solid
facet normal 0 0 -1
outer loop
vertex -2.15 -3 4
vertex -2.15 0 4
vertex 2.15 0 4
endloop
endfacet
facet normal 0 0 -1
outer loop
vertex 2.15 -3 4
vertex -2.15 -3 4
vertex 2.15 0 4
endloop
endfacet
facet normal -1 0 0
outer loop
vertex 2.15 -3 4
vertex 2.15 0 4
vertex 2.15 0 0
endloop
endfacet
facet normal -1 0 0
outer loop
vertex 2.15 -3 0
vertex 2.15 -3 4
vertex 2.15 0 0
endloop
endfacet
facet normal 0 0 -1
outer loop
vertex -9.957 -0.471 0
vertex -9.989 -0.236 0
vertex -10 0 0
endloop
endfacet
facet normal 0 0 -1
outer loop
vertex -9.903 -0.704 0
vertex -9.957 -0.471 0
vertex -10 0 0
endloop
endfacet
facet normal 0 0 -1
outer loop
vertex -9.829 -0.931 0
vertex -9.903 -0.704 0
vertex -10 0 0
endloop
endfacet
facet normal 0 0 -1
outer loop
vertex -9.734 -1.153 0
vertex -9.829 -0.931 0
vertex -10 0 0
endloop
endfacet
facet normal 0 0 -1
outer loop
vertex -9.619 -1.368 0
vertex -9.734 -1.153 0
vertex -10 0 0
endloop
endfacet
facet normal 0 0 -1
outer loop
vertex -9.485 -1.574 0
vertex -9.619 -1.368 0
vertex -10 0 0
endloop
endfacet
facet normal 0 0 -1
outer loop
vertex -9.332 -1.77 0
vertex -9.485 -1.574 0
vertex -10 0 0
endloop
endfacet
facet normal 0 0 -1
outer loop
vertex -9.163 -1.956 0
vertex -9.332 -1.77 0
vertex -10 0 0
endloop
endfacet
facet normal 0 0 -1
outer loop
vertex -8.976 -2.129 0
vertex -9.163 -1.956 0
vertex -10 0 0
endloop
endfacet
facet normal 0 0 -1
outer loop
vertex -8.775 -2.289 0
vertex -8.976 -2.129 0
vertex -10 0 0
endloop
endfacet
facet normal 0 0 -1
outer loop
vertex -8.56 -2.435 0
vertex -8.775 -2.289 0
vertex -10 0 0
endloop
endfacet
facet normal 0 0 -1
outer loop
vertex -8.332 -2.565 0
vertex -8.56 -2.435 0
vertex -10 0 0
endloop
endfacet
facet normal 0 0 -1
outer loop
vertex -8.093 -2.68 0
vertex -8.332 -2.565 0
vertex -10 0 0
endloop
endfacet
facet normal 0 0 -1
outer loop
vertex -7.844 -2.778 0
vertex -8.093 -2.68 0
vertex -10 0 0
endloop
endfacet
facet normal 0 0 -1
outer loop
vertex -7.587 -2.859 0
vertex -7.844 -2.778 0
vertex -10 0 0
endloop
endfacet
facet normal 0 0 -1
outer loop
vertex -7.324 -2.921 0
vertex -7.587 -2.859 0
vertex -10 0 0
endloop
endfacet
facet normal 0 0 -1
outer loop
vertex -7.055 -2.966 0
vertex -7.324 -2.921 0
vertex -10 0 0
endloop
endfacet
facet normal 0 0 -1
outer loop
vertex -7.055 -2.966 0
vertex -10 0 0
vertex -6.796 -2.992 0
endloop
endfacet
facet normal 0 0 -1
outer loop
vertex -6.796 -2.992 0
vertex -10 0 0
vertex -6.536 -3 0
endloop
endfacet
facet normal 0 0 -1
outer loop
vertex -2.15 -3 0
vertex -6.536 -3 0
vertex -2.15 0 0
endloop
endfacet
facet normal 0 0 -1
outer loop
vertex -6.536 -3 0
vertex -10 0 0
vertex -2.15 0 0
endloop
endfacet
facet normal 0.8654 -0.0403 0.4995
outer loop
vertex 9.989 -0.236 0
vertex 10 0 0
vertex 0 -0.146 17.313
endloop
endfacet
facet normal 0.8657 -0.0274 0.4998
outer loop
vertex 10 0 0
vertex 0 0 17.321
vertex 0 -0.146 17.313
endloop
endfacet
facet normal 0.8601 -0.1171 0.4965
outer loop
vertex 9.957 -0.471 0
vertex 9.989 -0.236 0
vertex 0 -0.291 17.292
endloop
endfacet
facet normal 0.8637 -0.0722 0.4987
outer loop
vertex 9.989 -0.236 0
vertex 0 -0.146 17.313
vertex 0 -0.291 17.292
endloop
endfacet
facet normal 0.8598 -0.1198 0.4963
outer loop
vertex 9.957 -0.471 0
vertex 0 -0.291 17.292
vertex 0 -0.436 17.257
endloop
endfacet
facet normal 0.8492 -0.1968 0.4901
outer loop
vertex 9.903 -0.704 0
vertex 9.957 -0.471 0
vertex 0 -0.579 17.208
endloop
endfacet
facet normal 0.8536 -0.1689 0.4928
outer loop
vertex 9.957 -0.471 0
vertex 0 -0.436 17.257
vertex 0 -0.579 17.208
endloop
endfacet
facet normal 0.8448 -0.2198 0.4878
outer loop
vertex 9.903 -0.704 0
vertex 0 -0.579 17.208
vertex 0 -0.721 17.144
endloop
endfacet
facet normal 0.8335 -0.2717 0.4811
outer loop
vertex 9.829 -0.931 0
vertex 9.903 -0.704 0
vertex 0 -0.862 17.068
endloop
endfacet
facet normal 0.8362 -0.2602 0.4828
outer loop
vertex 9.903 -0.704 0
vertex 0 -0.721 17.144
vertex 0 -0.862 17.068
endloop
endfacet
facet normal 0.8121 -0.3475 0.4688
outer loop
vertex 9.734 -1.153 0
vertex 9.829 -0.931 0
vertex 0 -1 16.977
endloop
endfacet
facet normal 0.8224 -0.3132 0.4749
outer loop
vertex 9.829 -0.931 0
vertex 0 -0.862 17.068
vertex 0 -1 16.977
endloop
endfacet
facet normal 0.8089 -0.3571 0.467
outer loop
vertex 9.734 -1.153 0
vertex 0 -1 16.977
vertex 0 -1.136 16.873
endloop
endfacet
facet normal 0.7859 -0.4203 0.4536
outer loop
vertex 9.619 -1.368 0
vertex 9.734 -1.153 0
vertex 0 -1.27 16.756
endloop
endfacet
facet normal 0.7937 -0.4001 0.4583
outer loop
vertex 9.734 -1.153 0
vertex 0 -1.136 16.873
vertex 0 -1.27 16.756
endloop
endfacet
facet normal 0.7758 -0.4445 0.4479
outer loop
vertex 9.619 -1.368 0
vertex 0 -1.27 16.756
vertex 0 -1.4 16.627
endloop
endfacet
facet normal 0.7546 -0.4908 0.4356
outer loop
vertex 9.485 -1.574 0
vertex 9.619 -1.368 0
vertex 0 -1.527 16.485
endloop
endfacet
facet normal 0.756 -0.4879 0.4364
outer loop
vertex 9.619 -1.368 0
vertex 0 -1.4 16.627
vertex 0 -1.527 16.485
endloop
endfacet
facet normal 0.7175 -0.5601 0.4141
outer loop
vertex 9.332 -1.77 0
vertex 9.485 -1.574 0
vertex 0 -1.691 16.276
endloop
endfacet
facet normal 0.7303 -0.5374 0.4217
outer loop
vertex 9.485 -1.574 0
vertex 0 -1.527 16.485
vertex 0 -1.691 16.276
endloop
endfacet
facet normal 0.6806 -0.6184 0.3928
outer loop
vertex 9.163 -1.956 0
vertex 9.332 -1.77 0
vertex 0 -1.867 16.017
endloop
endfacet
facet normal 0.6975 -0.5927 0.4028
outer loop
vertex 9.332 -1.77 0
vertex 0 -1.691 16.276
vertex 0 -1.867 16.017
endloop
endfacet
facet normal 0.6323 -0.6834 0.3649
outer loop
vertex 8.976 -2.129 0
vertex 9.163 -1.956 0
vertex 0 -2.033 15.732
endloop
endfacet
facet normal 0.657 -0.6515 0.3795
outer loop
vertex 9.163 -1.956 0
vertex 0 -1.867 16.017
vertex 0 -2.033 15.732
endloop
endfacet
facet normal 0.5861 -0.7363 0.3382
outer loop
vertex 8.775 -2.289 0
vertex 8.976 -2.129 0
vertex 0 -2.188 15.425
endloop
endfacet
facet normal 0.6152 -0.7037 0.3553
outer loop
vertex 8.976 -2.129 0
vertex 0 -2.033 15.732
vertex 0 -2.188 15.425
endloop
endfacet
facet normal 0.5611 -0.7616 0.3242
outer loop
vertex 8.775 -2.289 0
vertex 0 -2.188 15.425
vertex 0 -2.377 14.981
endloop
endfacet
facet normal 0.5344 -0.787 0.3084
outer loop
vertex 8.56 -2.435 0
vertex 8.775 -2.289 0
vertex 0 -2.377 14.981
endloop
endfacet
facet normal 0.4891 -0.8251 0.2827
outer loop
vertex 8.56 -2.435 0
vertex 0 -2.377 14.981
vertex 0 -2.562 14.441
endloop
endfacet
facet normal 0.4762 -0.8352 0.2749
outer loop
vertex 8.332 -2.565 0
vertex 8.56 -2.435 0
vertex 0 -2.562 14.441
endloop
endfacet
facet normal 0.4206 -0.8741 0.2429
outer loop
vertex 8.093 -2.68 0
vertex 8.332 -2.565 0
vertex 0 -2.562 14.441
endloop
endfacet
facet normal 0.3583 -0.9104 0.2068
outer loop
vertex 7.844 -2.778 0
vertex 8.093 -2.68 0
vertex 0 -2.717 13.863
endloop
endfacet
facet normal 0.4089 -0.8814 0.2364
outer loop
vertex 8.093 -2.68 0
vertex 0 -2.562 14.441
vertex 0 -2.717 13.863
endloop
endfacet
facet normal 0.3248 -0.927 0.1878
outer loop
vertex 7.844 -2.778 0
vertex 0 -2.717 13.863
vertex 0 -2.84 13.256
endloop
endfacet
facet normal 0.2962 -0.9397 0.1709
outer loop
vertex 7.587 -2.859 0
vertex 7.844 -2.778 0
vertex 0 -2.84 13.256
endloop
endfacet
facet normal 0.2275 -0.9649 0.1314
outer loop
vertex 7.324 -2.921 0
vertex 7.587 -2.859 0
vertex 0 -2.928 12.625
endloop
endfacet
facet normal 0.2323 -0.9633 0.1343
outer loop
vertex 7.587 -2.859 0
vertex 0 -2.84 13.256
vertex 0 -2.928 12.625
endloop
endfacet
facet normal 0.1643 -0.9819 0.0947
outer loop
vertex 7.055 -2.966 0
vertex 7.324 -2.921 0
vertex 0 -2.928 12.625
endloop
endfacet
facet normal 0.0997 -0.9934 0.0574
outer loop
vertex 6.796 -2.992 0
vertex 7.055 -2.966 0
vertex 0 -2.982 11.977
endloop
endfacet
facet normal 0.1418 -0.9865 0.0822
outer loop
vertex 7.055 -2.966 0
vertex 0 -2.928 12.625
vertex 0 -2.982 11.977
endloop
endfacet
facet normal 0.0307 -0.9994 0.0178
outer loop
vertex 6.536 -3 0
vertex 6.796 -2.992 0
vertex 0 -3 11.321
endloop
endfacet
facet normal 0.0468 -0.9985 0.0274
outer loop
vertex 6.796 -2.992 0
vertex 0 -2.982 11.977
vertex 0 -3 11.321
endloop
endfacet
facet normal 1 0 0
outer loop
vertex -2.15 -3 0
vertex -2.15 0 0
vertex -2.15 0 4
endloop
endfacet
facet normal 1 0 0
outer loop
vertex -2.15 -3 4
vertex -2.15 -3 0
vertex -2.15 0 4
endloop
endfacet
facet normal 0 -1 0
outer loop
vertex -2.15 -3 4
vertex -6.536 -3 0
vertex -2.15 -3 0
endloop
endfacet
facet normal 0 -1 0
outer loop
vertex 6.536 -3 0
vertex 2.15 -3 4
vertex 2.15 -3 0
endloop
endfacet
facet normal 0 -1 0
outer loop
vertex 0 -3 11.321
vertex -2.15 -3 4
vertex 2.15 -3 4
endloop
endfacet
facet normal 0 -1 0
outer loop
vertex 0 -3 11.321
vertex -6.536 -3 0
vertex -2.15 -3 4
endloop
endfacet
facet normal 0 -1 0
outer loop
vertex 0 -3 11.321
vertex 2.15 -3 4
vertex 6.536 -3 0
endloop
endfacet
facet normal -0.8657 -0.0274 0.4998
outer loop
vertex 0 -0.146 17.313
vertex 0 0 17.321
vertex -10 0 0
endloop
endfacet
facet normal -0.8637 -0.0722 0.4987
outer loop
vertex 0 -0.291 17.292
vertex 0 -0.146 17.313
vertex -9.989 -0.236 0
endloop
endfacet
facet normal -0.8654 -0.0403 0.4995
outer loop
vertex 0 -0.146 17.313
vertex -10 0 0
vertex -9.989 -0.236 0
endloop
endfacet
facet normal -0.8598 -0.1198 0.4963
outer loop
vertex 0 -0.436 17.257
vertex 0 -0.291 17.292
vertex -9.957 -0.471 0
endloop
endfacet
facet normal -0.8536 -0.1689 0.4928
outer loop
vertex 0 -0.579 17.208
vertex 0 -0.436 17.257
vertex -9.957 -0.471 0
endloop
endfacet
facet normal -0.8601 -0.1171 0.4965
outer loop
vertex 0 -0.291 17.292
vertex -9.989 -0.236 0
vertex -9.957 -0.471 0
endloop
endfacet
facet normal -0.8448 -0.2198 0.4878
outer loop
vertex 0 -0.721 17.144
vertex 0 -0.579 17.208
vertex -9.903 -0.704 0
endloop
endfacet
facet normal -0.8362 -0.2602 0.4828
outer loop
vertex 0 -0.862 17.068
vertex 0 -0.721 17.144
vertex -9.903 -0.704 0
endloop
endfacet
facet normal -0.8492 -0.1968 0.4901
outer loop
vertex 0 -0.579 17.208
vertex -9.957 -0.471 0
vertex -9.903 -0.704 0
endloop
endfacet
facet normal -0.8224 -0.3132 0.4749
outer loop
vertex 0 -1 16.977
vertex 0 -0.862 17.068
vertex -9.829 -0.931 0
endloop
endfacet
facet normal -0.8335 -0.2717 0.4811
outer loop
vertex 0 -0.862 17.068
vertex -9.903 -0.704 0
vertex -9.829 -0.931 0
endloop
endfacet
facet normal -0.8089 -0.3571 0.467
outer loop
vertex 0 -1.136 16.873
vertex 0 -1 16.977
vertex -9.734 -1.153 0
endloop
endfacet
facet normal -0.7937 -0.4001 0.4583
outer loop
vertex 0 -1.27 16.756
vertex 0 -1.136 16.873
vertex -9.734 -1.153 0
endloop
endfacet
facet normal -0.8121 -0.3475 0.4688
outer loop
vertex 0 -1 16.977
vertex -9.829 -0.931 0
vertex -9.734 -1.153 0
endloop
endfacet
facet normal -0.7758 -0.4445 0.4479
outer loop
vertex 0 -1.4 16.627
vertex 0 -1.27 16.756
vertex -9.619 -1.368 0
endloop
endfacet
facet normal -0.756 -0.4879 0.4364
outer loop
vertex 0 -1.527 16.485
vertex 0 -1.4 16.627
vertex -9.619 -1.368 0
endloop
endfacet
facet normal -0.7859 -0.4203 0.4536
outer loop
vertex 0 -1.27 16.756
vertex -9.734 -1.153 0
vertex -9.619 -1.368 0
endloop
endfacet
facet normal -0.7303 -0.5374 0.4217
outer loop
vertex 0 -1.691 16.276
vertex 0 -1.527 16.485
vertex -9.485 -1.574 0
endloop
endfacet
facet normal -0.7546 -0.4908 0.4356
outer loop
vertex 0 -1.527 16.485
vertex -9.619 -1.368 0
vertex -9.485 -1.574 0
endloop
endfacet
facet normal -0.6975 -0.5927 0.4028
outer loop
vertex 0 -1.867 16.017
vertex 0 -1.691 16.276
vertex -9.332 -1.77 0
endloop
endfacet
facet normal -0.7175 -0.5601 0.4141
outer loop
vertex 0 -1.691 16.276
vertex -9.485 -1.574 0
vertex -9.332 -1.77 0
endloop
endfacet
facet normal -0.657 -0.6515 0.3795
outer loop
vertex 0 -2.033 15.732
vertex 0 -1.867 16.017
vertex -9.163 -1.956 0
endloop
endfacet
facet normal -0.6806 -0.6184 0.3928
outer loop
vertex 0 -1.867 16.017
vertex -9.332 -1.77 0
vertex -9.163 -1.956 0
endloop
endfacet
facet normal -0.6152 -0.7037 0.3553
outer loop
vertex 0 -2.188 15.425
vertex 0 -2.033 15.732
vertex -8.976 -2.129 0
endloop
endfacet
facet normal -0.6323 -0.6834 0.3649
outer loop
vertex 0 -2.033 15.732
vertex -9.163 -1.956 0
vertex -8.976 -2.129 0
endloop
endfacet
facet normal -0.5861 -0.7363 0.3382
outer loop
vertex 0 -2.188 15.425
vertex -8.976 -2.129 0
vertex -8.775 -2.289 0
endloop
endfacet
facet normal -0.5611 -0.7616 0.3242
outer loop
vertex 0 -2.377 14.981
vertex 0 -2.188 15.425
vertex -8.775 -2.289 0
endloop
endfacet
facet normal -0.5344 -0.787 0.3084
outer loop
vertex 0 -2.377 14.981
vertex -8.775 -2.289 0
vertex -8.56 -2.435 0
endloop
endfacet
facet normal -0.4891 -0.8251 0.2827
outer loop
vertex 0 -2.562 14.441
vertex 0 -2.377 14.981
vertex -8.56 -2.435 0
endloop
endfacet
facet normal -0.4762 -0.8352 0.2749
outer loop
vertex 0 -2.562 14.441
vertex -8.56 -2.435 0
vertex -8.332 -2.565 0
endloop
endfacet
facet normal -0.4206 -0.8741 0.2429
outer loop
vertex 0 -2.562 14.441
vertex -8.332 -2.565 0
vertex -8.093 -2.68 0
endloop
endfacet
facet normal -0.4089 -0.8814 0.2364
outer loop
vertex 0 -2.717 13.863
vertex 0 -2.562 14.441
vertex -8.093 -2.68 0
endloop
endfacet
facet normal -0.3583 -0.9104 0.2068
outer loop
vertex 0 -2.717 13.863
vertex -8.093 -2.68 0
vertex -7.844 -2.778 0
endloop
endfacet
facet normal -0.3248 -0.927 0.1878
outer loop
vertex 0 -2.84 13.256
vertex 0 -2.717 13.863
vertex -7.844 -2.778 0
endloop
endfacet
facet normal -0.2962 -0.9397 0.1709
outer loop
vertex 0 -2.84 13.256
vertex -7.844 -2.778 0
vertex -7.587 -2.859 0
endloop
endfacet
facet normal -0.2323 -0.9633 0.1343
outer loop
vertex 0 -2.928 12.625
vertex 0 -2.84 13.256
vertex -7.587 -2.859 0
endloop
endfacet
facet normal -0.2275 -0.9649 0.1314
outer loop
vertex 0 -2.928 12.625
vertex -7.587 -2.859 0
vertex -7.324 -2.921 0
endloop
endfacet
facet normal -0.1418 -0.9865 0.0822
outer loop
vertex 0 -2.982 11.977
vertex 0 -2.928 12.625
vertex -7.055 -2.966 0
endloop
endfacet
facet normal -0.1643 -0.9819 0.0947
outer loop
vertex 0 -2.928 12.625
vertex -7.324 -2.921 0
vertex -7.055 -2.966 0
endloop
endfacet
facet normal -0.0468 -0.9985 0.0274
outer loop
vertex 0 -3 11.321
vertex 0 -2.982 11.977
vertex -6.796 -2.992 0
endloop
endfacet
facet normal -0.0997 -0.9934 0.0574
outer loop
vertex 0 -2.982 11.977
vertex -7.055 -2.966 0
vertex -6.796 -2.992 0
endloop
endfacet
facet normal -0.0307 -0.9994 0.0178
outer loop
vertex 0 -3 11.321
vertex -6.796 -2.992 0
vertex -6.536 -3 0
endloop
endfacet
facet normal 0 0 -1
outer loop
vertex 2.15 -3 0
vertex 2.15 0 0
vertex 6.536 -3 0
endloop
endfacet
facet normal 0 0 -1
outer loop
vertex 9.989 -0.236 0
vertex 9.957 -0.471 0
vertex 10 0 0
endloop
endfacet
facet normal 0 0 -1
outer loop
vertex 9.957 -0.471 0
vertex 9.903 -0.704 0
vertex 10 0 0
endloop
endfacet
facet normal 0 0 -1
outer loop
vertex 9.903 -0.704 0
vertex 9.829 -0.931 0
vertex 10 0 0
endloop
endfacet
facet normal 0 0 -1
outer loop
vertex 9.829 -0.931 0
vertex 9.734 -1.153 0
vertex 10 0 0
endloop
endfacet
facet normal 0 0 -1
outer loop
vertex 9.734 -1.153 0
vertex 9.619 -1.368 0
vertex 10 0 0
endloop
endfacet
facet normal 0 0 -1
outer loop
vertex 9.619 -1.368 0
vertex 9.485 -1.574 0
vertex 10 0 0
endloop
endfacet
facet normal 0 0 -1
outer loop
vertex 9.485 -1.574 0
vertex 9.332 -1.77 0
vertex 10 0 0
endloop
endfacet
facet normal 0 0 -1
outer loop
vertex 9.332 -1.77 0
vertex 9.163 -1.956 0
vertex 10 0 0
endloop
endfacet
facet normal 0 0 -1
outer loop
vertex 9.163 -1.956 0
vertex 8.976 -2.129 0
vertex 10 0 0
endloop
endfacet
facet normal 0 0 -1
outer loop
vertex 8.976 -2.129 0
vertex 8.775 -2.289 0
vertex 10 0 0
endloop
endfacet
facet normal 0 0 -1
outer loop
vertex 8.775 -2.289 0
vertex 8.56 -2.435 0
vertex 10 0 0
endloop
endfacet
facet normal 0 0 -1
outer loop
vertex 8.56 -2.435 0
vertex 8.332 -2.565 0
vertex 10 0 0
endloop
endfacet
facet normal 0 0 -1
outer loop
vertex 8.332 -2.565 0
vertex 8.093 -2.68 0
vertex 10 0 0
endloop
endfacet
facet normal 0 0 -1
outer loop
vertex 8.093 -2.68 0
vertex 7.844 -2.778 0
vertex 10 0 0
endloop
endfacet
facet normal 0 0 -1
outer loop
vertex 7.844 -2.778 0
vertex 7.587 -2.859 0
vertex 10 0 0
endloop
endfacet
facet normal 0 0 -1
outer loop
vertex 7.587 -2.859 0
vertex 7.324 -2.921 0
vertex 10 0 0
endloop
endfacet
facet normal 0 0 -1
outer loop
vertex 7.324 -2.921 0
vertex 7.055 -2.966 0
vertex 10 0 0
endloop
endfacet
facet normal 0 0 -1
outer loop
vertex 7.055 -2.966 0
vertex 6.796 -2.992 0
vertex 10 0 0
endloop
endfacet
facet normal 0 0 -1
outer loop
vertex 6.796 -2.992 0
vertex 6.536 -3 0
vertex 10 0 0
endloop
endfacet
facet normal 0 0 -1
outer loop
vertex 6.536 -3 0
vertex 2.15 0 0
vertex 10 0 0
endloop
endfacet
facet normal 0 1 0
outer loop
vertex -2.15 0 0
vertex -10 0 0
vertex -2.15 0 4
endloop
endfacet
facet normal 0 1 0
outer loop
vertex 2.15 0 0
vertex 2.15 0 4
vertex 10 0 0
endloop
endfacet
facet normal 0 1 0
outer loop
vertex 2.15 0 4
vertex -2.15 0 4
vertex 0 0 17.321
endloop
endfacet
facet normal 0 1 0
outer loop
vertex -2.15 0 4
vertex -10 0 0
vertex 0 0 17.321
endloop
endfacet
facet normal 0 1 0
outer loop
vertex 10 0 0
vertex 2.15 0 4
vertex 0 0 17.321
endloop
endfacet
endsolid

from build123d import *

# Parameters (mm, degrees)
F1_DEPTH = 3
F2_R     = 2.99999


# Not quite as in the source:
# - a fillet or chamfer is up to 0.001 mm smaller than in the source, because OpenCascade refuses the exact size


with BuildPart() as f1:
    # F0 (on Front) → F1 (new body)
    with BuildSketch(Plane.XZ):
        Polygon((0, 17.3205080757), (-10, 0), (-2.15, 0), (-2.15, 4), (2.15, 4), (2.15, 0), (10, 0), align=None)
    extrude(amount=F1_DEPTH)

    # F2 (radius 3 in the source; OpenCascade refuses exactly that, so slightly less here)
    f2_edges = [f1.edges().sort_by_distance(p)[0] for p in [
        (-5, -3, 8.660254),
        (5, -3, 8.660254),
    ]]
    fillet(f2_edges, radius=F2_R)


solid = f1.part
